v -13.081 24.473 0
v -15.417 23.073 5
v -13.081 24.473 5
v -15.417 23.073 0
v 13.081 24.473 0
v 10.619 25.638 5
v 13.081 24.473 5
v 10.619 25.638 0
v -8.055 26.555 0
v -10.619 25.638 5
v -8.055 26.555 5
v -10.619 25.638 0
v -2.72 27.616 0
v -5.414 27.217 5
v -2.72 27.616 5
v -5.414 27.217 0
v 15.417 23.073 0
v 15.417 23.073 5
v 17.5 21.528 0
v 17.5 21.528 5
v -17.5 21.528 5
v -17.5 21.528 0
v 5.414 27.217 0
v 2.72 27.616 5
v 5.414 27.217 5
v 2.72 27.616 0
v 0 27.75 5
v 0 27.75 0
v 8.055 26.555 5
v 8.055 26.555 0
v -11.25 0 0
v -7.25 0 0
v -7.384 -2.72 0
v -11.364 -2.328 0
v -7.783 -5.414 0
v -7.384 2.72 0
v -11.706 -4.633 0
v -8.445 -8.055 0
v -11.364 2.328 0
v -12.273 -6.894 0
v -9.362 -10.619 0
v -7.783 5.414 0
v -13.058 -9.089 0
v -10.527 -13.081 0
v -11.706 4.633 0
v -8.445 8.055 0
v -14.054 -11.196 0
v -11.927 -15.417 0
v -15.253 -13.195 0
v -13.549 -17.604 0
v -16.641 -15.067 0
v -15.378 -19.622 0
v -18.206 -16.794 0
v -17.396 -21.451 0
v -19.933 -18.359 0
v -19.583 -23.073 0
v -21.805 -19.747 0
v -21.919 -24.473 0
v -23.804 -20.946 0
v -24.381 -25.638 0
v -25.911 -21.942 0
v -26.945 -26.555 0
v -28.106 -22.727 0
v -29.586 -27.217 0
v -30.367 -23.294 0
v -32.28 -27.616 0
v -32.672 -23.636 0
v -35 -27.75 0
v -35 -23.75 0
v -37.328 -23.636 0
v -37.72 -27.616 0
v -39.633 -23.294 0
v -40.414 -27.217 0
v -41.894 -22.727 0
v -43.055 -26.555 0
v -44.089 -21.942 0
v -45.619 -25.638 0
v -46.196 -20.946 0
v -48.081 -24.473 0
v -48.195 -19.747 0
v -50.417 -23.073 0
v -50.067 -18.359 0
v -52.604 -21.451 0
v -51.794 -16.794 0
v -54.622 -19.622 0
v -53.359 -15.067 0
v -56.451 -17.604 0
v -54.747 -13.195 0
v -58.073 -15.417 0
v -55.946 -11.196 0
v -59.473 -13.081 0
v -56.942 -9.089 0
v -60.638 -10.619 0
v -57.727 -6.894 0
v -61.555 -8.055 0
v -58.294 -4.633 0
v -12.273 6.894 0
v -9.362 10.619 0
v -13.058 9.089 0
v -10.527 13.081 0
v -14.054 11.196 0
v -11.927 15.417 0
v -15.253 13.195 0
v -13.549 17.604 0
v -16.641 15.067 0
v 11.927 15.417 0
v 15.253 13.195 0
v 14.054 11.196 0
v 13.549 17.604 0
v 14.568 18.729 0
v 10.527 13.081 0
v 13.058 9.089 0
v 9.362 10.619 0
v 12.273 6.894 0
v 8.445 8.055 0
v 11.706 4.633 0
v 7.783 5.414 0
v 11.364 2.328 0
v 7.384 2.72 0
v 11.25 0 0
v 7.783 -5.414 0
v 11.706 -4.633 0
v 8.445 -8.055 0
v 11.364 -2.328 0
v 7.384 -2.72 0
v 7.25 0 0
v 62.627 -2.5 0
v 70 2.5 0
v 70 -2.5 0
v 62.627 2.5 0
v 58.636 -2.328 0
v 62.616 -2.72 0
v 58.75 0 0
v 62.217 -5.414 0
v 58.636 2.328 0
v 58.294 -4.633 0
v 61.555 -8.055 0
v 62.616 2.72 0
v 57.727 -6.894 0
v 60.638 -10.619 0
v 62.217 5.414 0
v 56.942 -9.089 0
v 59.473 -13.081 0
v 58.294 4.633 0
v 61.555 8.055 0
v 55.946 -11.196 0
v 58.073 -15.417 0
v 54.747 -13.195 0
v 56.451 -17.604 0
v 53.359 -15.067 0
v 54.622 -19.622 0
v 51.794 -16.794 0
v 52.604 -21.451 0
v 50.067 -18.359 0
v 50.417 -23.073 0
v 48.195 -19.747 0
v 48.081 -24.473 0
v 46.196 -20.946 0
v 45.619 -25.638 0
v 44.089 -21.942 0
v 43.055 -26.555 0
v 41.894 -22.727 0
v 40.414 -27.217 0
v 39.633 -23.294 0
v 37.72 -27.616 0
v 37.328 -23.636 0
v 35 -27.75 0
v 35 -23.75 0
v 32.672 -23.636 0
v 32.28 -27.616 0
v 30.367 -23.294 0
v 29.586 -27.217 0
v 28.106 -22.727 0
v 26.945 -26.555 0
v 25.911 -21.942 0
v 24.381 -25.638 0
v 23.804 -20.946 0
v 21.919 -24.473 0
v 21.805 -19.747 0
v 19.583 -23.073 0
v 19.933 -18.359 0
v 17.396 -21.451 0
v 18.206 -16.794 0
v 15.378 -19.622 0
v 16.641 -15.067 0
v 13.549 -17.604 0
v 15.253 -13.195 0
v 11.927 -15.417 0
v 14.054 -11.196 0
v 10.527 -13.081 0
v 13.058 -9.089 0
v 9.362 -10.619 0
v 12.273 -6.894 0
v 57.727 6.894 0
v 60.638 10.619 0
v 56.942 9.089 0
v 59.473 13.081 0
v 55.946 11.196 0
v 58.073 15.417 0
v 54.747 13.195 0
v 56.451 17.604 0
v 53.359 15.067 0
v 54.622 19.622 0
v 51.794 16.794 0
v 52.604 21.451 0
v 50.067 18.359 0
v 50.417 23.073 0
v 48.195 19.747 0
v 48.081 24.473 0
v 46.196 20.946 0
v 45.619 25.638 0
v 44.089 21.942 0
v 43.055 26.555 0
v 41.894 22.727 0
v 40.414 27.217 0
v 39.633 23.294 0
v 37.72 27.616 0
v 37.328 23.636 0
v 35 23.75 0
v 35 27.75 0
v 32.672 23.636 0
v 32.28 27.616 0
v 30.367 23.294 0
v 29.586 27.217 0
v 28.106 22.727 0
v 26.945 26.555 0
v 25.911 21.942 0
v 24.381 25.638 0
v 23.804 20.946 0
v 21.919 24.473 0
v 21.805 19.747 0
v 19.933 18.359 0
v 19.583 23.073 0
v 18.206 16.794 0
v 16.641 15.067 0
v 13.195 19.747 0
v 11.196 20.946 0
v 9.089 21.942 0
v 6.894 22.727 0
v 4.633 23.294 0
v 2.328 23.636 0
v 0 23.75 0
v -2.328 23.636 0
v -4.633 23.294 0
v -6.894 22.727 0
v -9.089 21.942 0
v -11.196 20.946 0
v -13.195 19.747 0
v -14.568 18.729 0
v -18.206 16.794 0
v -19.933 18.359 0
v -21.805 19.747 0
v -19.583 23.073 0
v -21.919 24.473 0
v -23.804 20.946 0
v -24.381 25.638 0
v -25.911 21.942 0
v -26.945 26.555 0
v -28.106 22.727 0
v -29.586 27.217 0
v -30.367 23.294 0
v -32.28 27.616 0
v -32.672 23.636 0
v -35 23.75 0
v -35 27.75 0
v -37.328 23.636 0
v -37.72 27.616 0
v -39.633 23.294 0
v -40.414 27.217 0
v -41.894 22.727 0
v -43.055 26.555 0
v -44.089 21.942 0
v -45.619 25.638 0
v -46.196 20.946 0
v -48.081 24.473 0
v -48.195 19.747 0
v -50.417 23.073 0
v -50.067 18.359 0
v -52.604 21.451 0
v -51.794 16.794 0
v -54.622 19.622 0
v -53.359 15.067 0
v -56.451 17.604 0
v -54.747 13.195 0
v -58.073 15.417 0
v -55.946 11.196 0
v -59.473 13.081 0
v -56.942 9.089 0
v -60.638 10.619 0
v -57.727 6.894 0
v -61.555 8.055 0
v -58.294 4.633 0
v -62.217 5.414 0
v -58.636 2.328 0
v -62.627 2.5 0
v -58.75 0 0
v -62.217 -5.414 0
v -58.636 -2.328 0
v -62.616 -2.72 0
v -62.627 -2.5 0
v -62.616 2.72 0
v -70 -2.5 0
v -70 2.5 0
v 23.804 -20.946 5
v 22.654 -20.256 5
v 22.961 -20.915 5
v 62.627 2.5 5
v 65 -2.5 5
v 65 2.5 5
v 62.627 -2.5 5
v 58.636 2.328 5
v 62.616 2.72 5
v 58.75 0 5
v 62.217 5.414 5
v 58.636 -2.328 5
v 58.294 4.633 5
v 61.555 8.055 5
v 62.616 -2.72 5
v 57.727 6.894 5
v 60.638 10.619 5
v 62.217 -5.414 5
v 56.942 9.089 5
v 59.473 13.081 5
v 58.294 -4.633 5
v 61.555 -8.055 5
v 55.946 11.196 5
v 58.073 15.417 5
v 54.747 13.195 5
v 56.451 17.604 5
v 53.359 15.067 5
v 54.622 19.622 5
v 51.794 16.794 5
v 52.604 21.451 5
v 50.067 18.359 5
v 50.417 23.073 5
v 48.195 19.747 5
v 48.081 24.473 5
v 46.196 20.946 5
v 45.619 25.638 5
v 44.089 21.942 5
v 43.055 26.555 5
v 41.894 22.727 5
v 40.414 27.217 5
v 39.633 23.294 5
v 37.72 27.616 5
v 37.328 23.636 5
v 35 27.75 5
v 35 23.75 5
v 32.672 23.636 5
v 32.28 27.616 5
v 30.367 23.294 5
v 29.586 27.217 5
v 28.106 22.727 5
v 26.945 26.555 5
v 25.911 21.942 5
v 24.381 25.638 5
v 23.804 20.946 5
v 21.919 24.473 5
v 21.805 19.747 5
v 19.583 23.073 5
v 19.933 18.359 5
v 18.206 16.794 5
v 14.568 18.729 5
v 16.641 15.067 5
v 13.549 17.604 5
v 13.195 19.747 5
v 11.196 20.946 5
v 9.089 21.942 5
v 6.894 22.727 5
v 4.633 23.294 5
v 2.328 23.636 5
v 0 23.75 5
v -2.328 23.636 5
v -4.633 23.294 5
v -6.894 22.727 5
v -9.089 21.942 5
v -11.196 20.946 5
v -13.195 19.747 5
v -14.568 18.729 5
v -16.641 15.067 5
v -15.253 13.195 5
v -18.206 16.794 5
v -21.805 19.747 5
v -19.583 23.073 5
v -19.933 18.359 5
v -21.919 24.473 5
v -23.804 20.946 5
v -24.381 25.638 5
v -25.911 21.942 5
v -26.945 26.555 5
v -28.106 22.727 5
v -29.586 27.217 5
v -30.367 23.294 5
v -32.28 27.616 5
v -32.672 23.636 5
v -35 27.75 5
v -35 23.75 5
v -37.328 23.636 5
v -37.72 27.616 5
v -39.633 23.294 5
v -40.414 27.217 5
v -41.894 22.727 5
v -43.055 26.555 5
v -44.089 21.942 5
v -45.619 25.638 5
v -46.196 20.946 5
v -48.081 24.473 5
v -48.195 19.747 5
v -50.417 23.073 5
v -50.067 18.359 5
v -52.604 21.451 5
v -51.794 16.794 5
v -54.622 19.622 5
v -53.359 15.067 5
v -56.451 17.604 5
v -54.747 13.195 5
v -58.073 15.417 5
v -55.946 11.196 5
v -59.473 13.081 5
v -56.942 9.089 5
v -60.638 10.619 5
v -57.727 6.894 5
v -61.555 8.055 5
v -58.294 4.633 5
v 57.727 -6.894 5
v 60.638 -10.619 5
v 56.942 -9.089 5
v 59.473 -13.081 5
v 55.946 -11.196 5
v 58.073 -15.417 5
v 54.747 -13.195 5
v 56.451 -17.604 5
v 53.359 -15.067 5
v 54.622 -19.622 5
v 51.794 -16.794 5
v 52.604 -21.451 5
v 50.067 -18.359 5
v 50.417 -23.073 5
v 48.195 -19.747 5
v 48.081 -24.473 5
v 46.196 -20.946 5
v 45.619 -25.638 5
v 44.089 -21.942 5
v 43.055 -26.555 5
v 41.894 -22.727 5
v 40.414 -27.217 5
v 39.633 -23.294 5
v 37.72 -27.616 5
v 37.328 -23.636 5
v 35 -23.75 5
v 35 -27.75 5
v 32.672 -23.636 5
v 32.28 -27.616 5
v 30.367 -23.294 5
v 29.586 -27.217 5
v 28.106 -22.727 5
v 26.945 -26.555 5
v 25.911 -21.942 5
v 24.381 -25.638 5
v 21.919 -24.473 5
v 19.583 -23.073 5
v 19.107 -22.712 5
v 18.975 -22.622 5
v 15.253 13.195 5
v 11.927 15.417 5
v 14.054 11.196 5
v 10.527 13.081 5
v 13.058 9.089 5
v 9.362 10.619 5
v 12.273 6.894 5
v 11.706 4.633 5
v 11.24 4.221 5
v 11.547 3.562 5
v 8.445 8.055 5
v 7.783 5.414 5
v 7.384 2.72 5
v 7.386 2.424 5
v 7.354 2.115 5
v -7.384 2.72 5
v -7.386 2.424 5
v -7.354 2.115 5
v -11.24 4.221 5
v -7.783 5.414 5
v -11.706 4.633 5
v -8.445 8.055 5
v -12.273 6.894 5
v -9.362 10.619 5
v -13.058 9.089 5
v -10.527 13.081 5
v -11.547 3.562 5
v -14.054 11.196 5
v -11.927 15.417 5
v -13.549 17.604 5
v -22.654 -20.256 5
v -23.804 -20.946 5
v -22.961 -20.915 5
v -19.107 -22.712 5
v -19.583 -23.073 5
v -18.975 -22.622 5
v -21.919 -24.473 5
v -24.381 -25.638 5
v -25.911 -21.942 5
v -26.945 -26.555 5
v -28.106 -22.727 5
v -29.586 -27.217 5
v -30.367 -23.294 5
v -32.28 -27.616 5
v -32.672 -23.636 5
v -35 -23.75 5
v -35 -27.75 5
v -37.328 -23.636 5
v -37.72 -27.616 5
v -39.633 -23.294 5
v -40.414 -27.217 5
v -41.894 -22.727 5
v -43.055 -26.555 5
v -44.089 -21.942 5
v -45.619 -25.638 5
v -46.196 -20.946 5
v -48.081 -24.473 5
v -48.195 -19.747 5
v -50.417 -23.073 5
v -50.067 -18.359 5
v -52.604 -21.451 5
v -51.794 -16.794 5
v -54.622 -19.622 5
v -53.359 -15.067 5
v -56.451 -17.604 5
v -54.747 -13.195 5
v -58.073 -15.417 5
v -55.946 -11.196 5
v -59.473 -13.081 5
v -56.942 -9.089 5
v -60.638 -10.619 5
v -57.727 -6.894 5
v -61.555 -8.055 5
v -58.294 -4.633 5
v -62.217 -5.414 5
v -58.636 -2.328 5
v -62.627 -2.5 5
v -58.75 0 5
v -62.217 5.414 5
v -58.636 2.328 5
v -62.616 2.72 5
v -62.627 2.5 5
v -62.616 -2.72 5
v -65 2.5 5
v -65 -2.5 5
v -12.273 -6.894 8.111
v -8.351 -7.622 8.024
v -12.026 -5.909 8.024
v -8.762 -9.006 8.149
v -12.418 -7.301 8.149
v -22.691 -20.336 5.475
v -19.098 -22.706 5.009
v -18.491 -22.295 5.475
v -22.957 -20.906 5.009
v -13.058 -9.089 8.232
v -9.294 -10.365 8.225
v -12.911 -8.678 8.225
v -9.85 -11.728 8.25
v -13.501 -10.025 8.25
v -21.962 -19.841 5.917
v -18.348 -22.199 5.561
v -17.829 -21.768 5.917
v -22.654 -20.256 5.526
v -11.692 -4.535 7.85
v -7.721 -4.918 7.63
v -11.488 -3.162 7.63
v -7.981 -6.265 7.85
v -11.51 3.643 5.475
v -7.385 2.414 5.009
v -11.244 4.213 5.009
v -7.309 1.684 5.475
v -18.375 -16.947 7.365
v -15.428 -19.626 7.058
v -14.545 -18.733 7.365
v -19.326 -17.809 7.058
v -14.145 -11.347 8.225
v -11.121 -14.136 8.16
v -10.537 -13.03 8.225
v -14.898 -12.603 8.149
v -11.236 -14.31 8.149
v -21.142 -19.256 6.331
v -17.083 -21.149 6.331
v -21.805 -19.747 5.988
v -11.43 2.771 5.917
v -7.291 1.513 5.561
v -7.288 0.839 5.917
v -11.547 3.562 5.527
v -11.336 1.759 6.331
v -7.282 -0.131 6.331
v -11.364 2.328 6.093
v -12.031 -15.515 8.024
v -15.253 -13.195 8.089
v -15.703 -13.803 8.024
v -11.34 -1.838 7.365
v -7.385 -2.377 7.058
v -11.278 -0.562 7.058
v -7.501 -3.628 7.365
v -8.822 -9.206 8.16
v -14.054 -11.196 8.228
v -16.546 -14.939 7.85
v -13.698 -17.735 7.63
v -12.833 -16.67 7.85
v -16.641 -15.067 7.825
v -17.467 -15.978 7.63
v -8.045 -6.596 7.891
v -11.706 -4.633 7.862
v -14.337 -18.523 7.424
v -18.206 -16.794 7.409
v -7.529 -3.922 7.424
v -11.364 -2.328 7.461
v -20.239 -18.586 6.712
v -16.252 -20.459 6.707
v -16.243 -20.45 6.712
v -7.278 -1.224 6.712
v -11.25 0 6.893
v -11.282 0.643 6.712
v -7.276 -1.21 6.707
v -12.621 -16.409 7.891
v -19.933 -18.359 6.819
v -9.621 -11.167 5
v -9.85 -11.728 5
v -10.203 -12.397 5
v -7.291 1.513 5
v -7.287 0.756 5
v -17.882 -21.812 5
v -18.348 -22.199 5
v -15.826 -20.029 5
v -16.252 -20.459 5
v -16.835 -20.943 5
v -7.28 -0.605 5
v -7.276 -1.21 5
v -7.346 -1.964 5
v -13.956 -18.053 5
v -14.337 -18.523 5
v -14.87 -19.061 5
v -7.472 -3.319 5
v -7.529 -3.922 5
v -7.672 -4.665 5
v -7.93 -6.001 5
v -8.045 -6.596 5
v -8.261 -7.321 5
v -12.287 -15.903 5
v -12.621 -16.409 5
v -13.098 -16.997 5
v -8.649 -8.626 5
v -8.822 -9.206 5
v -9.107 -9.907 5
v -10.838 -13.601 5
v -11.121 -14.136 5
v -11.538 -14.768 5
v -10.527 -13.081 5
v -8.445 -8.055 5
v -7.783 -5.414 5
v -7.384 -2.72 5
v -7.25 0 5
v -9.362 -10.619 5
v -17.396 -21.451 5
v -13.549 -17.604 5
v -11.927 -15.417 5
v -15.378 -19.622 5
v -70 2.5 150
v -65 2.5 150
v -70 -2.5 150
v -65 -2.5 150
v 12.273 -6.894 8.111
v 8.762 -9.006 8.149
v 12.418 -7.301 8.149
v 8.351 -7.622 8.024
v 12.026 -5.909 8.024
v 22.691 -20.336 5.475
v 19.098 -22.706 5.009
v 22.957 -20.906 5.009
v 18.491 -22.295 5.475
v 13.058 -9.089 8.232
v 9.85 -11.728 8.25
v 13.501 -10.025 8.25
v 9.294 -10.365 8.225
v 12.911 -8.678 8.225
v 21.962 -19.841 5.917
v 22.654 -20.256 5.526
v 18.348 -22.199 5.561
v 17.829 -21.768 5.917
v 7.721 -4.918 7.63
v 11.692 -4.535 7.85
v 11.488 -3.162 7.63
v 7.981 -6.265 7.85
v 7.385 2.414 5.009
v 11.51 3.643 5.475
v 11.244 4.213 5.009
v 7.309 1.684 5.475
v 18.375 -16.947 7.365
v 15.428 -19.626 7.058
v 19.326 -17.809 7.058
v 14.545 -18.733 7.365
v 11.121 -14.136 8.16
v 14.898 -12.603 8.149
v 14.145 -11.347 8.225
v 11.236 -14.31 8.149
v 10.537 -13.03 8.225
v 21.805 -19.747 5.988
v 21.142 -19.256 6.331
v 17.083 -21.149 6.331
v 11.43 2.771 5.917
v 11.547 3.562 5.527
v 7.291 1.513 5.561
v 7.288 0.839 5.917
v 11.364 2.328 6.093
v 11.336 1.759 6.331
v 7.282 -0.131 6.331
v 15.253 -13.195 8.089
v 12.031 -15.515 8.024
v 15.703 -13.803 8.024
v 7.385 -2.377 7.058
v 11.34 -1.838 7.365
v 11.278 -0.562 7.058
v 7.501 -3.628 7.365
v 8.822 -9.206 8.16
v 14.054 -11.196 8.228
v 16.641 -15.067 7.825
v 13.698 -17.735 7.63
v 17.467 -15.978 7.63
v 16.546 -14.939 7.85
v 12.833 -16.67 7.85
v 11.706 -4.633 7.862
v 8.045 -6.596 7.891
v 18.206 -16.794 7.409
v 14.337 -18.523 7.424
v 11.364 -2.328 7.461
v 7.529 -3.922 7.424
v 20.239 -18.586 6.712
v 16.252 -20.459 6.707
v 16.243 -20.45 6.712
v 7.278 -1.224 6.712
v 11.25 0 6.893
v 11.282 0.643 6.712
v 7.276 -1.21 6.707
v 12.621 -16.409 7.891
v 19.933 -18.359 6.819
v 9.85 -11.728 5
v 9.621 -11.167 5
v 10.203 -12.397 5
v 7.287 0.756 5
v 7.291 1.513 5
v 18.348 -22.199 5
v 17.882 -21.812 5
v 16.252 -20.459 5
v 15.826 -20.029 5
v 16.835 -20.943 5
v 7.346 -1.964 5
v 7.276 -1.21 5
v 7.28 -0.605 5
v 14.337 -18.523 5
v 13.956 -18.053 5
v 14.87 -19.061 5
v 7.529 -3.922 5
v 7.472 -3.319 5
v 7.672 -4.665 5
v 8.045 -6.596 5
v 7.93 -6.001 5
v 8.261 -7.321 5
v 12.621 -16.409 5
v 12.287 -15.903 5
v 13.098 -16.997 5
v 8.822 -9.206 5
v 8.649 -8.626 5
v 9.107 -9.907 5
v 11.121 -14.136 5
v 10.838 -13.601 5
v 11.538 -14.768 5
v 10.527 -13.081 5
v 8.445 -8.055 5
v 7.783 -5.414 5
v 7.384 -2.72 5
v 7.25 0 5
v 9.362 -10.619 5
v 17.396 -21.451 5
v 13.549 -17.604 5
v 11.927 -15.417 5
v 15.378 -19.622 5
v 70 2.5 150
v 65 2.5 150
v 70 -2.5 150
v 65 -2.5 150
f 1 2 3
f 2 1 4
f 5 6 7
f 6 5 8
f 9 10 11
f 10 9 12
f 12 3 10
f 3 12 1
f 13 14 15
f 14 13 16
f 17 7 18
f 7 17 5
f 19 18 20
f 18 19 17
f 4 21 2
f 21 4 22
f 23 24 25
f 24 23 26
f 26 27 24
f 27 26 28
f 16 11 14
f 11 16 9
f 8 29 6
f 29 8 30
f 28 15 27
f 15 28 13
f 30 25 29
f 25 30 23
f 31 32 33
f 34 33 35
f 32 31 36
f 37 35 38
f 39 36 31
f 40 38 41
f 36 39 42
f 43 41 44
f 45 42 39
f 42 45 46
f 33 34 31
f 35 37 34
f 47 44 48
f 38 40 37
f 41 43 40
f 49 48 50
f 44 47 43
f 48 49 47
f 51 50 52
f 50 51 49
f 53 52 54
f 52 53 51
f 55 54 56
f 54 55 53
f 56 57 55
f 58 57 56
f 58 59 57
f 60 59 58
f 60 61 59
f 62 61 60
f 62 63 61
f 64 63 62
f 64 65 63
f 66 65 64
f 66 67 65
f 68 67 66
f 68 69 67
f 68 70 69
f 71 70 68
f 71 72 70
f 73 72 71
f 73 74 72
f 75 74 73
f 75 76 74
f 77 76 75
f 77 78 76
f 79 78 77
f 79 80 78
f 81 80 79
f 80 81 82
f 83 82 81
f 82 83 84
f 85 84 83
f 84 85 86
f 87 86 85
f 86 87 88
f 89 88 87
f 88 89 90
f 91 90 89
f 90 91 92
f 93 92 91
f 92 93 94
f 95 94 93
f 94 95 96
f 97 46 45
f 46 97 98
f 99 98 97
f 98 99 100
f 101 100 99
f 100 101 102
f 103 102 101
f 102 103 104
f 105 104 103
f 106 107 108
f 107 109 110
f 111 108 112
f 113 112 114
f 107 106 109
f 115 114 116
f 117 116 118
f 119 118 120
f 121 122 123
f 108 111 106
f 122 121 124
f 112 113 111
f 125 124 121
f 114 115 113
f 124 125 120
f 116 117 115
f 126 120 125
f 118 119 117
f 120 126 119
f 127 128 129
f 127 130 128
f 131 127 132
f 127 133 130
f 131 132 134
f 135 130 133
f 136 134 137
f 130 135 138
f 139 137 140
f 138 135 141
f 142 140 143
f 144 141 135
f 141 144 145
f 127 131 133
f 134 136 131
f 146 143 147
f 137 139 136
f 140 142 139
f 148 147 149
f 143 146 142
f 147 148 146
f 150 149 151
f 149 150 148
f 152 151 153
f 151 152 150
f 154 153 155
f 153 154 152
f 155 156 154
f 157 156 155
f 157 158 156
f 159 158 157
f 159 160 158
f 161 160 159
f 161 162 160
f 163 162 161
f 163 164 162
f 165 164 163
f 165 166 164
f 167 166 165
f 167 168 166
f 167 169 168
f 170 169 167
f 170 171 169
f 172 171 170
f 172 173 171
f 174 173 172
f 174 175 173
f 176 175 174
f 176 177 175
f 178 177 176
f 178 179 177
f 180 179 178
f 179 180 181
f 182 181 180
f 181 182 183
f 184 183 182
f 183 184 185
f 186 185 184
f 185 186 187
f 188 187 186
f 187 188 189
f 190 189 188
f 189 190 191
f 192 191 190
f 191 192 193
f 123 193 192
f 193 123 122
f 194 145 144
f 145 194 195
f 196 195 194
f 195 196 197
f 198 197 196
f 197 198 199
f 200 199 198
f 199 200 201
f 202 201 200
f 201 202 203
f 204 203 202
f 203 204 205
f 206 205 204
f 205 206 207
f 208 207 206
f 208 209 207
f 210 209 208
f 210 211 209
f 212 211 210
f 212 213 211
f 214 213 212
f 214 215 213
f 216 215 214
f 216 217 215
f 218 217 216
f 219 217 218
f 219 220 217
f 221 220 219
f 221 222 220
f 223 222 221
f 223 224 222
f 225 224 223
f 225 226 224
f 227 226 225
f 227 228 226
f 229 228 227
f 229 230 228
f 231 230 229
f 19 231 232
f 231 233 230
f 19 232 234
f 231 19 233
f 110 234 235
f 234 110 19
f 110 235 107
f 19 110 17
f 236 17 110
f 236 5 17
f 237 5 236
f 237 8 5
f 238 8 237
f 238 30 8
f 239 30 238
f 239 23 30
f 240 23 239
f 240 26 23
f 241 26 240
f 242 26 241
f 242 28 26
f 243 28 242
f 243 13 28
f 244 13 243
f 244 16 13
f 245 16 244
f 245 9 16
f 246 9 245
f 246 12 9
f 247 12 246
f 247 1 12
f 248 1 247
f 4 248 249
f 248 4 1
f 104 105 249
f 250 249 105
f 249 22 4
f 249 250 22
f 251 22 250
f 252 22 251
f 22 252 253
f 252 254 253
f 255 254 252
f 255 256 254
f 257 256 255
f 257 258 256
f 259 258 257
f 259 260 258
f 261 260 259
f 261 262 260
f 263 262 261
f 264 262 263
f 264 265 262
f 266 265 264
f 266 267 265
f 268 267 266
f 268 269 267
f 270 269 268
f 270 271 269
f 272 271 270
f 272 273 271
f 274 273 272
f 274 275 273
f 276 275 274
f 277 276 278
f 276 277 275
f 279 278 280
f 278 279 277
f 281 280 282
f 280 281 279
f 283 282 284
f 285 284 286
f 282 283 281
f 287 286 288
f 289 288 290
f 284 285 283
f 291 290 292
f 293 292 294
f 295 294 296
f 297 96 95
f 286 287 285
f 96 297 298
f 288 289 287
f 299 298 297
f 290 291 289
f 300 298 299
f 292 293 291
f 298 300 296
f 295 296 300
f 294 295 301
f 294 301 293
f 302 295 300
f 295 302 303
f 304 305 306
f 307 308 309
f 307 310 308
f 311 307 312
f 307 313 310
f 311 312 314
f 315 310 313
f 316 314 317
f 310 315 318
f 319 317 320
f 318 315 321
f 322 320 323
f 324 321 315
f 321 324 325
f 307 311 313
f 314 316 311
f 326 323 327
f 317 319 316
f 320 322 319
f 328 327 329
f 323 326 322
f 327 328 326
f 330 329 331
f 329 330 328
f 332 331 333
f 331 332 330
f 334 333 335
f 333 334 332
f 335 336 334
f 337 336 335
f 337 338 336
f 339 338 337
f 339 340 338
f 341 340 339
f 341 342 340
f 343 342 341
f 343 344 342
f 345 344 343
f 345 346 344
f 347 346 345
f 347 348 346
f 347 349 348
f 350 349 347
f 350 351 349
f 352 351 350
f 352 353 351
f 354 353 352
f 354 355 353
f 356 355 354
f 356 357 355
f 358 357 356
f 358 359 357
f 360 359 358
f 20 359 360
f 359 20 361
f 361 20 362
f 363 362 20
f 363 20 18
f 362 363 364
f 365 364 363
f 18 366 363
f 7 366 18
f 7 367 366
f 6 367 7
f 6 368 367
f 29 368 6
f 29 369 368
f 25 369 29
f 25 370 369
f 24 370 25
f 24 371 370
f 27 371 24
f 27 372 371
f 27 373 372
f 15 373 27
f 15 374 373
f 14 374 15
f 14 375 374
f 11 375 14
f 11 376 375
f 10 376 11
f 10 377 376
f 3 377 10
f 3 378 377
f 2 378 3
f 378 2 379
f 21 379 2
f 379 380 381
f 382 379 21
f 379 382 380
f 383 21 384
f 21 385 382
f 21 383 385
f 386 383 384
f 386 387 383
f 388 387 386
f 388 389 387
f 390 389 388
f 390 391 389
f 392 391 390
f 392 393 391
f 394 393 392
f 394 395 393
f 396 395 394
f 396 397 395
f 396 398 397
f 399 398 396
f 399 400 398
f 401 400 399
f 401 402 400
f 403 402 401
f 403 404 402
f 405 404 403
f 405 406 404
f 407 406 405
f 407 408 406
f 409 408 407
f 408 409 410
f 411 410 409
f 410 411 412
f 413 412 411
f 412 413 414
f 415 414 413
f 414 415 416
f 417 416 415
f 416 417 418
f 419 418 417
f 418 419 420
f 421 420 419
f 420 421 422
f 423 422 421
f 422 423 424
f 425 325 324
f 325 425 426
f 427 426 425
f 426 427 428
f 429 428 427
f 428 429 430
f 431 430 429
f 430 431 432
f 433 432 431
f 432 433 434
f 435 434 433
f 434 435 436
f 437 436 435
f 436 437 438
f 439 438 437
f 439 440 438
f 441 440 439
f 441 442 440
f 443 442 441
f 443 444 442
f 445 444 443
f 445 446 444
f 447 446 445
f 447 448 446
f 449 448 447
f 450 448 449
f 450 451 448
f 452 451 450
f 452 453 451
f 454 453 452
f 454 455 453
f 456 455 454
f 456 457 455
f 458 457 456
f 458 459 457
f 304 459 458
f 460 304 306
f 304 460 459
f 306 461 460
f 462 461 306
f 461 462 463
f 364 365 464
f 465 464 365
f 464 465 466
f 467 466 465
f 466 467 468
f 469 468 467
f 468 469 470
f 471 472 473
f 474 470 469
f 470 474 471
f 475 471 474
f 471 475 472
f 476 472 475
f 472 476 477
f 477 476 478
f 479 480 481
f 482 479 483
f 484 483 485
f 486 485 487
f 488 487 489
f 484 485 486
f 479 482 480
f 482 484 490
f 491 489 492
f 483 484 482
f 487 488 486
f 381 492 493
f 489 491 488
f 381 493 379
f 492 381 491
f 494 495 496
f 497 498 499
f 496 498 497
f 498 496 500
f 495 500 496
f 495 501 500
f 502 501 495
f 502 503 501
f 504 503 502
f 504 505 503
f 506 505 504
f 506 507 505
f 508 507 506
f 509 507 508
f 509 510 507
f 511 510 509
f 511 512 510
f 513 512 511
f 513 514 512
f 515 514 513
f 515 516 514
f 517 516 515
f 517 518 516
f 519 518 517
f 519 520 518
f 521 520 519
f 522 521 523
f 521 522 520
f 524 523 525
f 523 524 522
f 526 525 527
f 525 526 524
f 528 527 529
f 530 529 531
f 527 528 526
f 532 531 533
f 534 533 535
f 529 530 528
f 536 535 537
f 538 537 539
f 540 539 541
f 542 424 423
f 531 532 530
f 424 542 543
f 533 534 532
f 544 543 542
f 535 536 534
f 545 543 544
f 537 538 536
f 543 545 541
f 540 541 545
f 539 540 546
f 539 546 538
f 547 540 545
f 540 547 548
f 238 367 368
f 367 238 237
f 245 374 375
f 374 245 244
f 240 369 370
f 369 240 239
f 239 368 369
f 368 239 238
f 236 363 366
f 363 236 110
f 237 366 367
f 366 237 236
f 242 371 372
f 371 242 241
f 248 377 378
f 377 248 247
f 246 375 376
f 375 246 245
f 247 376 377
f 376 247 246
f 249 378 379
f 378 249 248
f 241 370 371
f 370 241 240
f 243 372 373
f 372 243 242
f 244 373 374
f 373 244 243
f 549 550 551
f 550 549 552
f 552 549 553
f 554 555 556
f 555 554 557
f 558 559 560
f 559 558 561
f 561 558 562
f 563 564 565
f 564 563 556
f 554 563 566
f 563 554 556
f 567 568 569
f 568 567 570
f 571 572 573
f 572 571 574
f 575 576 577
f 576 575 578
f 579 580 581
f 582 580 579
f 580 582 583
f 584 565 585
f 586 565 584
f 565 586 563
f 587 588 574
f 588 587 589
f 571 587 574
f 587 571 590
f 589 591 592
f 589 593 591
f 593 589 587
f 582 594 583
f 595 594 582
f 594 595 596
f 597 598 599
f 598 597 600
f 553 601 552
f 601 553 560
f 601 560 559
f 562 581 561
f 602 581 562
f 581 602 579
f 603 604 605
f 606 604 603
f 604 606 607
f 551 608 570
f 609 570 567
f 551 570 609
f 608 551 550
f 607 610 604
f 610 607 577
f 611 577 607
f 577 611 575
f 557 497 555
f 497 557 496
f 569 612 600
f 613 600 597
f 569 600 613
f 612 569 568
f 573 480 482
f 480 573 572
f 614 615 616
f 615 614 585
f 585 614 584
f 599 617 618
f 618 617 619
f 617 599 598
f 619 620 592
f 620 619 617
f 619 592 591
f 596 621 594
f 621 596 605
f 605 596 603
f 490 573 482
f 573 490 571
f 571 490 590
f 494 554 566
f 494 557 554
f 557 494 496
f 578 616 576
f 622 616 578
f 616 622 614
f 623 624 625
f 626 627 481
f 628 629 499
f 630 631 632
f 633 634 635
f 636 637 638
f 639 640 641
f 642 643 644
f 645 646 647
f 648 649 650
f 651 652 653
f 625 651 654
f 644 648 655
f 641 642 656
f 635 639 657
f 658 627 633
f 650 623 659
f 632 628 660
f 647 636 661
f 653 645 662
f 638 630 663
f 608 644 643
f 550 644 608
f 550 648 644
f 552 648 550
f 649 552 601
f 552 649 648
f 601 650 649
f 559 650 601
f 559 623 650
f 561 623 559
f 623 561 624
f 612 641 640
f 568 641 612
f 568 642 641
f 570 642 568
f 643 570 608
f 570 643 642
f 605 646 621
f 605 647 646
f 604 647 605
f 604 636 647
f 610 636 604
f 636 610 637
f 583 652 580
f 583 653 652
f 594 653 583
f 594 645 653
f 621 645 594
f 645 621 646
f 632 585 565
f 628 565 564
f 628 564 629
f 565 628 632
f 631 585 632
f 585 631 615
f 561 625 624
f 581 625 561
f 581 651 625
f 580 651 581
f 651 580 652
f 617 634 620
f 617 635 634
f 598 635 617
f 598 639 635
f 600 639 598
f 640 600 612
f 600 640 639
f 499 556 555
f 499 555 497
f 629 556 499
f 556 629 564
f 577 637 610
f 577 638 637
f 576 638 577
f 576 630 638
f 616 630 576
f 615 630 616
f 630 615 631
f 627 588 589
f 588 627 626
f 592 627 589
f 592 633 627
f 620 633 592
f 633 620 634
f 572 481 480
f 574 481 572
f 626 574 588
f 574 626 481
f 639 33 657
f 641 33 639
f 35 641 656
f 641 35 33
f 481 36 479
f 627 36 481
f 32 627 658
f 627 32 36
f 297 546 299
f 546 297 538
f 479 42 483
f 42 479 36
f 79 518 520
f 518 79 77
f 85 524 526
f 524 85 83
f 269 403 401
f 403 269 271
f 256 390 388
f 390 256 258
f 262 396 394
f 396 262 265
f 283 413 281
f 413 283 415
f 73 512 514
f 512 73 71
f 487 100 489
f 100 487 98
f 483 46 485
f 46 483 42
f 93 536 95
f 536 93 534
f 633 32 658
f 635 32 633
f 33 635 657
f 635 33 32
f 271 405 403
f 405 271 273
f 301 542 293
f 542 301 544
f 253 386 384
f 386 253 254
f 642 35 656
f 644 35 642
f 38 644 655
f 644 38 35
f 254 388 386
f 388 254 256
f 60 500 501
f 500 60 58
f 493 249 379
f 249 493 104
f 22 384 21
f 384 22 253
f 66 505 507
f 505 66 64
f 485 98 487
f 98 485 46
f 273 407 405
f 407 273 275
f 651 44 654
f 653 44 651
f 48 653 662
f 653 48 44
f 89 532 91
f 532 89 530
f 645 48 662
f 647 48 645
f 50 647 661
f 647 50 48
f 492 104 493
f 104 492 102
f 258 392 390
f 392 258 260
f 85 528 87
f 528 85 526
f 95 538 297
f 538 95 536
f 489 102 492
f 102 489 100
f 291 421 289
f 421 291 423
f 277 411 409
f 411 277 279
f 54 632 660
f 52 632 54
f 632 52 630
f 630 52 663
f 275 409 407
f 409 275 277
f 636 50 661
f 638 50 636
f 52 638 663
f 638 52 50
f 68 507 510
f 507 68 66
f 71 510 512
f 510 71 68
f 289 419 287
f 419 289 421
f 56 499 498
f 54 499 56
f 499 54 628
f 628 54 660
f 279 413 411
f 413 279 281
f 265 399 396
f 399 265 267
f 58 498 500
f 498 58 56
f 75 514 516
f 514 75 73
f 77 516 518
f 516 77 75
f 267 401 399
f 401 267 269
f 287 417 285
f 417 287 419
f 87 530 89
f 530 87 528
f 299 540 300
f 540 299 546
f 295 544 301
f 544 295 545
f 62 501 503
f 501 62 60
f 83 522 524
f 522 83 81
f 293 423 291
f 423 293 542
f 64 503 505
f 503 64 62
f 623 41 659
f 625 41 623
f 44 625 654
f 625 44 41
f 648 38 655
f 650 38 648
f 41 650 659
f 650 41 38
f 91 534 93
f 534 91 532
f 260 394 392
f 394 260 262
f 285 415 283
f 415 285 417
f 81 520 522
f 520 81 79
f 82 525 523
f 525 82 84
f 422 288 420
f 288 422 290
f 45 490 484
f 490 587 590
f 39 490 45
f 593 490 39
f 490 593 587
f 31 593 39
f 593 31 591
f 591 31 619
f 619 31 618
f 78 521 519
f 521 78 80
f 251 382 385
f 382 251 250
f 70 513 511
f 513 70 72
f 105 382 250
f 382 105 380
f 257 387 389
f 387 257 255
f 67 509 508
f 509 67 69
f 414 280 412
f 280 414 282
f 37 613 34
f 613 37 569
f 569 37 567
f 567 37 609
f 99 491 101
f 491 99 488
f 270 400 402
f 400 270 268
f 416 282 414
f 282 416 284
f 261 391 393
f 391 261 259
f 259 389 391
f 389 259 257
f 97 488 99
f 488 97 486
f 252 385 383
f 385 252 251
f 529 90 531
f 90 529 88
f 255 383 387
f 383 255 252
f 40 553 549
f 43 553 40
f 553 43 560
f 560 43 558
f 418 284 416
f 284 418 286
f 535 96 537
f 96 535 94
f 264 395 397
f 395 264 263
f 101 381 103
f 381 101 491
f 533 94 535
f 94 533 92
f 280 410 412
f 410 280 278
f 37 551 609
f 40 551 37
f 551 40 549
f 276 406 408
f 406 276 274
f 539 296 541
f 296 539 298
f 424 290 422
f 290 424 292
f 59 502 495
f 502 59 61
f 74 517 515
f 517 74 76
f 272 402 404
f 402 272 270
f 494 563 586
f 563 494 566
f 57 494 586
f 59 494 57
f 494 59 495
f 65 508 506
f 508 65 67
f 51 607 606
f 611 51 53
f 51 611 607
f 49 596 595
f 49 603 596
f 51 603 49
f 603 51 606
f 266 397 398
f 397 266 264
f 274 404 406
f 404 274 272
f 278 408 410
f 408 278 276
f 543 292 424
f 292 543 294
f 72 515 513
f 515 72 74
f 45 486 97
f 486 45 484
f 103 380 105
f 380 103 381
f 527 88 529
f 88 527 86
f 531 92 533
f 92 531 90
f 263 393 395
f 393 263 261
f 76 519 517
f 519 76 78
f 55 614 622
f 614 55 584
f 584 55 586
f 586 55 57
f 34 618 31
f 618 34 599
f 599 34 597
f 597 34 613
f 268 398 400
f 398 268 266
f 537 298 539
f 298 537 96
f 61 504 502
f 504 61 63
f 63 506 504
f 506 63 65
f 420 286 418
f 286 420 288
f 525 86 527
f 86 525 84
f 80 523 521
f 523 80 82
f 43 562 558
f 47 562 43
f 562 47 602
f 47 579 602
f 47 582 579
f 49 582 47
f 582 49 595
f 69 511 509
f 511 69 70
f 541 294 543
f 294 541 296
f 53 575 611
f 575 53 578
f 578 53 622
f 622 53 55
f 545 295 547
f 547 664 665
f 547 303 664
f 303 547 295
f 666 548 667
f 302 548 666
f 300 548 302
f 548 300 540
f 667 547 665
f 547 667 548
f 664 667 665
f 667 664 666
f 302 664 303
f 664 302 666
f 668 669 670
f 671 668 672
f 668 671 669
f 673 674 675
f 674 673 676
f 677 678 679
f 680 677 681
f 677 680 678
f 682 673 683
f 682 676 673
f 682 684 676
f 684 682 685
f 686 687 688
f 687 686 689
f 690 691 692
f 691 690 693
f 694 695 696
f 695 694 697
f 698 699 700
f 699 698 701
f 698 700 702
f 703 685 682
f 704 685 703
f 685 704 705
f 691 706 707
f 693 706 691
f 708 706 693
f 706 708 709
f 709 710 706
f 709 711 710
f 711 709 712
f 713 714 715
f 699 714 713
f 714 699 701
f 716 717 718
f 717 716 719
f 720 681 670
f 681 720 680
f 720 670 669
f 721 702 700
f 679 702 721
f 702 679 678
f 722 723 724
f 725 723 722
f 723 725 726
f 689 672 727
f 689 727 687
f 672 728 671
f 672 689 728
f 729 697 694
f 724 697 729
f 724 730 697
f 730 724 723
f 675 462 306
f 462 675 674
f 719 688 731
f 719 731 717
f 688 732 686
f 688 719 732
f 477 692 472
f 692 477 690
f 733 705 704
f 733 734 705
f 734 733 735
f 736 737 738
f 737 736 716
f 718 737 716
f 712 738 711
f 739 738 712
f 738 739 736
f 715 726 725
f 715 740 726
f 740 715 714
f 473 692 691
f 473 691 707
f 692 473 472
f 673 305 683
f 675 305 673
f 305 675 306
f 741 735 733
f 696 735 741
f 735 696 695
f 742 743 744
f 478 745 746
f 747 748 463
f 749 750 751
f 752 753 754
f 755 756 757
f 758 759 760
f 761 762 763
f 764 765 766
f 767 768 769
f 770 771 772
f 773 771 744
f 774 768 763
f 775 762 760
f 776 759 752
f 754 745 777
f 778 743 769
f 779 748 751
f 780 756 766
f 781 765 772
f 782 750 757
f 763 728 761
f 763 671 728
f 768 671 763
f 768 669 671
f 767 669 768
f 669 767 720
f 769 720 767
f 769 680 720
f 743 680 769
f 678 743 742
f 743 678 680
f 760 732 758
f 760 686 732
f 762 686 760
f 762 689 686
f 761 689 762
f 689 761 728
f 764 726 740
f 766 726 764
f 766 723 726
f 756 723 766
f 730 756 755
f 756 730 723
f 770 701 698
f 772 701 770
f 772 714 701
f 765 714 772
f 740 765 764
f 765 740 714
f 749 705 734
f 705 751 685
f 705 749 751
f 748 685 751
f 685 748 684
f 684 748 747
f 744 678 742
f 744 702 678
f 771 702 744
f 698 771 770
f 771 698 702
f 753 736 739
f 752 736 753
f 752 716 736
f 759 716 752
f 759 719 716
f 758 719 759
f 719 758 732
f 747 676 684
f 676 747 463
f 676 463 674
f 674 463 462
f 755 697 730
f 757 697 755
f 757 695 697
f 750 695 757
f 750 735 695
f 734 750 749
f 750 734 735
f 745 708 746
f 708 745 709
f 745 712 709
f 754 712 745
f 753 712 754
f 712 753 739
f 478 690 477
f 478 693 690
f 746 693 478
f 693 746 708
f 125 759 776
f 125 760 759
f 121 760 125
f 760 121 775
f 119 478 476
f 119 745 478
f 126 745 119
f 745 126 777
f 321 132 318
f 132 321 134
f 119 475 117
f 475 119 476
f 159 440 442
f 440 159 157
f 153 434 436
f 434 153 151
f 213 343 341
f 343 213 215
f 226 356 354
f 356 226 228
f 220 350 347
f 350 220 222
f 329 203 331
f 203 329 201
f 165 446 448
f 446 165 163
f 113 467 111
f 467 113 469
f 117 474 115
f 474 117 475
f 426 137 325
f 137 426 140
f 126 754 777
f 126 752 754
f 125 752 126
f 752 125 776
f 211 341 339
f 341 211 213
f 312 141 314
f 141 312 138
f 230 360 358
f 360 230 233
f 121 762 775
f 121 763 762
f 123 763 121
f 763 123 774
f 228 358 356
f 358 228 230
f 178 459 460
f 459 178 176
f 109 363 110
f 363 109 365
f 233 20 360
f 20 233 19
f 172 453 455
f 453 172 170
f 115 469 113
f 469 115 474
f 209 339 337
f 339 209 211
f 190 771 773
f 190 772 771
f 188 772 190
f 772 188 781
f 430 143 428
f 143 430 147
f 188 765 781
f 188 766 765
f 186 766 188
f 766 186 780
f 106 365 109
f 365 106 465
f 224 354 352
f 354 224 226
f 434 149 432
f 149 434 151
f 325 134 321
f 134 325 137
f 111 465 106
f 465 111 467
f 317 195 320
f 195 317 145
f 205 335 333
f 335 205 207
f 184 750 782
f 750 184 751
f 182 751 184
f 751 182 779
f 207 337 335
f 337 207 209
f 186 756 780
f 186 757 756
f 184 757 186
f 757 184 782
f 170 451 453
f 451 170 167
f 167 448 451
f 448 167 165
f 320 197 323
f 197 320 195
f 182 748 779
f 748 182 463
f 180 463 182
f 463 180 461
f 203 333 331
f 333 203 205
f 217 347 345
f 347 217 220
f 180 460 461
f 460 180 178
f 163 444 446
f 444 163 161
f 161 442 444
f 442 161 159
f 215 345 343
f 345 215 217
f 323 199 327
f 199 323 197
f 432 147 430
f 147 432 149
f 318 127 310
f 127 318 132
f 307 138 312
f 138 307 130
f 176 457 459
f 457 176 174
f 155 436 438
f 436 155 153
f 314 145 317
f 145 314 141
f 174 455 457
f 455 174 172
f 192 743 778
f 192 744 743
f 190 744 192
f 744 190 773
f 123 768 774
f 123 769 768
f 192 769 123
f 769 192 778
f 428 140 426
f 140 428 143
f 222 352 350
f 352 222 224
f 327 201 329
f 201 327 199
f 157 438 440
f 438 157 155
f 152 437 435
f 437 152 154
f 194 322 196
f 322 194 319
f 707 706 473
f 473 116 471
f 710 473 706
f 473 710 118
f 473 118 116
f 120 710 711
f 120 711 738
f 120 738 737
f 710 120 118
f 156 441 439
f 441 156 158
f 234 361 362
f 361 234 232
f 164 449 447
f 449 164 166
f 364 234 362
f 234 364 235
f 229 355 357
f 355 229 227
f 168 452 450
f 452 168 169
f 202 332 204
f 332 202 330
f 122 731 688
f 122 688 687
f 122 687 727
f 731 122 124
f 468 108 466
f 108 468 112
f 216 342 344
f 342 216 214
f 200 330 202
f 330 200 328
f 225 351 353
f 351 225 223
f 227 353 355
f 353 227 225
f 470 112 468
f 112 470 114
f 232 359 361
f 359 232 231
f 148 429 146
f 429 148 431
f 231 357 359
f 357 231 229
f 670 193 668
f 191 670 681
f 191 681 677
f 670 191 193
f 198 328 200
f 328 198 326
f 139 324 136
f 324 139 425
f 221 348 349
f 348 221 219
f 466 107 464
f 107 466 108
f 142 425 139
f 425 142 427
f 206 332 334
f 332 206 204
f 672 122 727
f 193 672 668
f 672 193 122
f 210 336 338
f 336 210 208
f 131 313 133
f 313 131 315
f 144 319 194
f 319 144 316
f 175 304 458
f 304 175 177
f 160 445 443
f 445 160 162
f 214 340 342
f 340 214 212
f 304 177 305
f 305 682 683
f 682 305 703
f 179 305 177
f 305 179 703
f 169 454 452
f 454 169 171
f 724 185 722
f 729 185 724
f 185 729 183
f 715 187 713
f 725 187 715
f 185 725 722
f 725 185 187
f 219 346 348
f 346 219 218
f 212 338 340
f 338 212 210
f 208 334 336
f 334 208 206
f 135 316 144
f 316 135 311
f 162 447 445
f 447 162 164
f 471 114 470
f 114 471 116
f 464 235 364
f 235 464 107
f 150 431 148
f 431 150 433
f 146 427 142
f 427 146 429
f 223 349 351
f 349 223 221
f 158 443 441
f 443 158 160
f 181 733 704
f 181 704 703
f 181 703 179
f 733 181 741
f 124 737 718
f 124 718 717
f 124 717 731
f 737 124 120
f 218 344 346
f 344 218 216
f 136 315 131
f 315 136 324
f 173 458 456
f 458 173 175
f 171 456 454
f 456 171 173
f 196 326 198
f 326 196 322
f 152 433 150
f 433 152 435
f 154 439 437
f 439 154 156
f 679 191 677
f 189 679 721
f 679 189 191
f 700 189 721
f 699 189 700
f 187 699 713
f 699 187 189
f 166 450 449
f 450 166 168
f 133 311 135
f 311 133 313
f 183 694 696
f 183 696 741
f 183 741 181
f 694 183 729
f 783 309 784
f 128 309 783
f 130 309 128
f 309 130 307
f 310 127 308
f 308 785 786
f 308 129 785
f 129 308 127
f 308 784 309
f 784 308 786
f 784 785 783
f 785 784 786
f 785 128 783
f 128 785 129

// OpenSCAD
//Lens diameter
gdiam=47.5;
//Temple size (width of glasses).
tsize=135;
//Pupil distance
pd=70;
//Glasses thickness
th=4;
//Temple length
lscales=150;
//Thickness of the lenses
gheight=5;

$fn=64;

module EyeCylinder()
{
        difference()
        {
            union()
            {
                cylinder(d=gdiam+th*2, h=gheight);
                NosePad();
            }
            LensHole();
        }  
}

module  LensHole()
{
    translate([0,0,-.1])
    cylinder(d=gdiam, h=gheight*2.2, center=true);
}

module NosePad()
{
    rotate([0,0,-25])
    intersection()
    {
        translate([gdiam/2,0,th/2])
     
        scale([1,1,.35])
        rotate([0,90,0])
        cylinder(r=15, h=th*2, center=true);

        scale(100) // The lower half only
        translate([-.5,-.5,-1])
        cube(1);
        
        cylinder(d=gdiam+th*2, h=gheight*15, center=true); // Inside the lens cylinder
    }
}

module Eye()
{
    EyeCylinder();
    translate([0,0,gheight])
    mirror([0,0,1])
    {
        offs=(tsize-pd)/2;
        
        translate([-offs,0,0])
        scale([offs-(gdiam+2*th)/2, gheight, gheight])
        translate([.65,0,.5])
        cube(1, center=true);
        
        
        translate([-offs,0,])
        scale([gheight,gheight,lscales])
        translate([0,0,.5])
        cube(1,center=true);
    }
}

module TwoEyes()
{
    translate([-pd/2,0,gheight]) // Center
    mirror([0,0,1])
    union()
    {
        Eye();
        translate([pd,0,0])
        mirror([1,0,0]) // Not necessary for a round lens
        Eye();
    }
}

module RoundGlasses()
{
    difference()
    {
        cylinder(d=gdiam+th*2, h=gheight);
        LensHole();
        translate([-pd/2,0,0])
        LensHole();
        translate([pd/2,0,0])
        LensHole();
        translate([-pd/2,-pd,-pd/2])
        cube(pd);
    }
    TwoEyes();
}

RoundGlasses();


        
